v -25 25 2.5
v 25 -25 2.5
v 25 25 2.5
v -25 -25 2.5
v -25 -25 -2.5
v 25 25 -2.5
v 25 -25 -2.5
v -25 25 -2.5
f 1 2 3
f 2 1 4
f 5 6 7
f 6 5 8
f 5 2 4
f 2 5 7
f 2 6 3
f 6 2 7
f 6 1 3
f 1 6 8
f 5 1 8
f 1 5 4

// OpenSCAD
// Define parameters for the flat square plate
plate_size = 50; // Length and width of the square plate
plate_thickness = 5; // Thickness of the plate

// Function to create a flat square plate
module flat_square_plate() {
    cube([plate_size, plate_size, plate_thickness], center = true);
}

// Render a single flat square plate
flat_square_plate();
